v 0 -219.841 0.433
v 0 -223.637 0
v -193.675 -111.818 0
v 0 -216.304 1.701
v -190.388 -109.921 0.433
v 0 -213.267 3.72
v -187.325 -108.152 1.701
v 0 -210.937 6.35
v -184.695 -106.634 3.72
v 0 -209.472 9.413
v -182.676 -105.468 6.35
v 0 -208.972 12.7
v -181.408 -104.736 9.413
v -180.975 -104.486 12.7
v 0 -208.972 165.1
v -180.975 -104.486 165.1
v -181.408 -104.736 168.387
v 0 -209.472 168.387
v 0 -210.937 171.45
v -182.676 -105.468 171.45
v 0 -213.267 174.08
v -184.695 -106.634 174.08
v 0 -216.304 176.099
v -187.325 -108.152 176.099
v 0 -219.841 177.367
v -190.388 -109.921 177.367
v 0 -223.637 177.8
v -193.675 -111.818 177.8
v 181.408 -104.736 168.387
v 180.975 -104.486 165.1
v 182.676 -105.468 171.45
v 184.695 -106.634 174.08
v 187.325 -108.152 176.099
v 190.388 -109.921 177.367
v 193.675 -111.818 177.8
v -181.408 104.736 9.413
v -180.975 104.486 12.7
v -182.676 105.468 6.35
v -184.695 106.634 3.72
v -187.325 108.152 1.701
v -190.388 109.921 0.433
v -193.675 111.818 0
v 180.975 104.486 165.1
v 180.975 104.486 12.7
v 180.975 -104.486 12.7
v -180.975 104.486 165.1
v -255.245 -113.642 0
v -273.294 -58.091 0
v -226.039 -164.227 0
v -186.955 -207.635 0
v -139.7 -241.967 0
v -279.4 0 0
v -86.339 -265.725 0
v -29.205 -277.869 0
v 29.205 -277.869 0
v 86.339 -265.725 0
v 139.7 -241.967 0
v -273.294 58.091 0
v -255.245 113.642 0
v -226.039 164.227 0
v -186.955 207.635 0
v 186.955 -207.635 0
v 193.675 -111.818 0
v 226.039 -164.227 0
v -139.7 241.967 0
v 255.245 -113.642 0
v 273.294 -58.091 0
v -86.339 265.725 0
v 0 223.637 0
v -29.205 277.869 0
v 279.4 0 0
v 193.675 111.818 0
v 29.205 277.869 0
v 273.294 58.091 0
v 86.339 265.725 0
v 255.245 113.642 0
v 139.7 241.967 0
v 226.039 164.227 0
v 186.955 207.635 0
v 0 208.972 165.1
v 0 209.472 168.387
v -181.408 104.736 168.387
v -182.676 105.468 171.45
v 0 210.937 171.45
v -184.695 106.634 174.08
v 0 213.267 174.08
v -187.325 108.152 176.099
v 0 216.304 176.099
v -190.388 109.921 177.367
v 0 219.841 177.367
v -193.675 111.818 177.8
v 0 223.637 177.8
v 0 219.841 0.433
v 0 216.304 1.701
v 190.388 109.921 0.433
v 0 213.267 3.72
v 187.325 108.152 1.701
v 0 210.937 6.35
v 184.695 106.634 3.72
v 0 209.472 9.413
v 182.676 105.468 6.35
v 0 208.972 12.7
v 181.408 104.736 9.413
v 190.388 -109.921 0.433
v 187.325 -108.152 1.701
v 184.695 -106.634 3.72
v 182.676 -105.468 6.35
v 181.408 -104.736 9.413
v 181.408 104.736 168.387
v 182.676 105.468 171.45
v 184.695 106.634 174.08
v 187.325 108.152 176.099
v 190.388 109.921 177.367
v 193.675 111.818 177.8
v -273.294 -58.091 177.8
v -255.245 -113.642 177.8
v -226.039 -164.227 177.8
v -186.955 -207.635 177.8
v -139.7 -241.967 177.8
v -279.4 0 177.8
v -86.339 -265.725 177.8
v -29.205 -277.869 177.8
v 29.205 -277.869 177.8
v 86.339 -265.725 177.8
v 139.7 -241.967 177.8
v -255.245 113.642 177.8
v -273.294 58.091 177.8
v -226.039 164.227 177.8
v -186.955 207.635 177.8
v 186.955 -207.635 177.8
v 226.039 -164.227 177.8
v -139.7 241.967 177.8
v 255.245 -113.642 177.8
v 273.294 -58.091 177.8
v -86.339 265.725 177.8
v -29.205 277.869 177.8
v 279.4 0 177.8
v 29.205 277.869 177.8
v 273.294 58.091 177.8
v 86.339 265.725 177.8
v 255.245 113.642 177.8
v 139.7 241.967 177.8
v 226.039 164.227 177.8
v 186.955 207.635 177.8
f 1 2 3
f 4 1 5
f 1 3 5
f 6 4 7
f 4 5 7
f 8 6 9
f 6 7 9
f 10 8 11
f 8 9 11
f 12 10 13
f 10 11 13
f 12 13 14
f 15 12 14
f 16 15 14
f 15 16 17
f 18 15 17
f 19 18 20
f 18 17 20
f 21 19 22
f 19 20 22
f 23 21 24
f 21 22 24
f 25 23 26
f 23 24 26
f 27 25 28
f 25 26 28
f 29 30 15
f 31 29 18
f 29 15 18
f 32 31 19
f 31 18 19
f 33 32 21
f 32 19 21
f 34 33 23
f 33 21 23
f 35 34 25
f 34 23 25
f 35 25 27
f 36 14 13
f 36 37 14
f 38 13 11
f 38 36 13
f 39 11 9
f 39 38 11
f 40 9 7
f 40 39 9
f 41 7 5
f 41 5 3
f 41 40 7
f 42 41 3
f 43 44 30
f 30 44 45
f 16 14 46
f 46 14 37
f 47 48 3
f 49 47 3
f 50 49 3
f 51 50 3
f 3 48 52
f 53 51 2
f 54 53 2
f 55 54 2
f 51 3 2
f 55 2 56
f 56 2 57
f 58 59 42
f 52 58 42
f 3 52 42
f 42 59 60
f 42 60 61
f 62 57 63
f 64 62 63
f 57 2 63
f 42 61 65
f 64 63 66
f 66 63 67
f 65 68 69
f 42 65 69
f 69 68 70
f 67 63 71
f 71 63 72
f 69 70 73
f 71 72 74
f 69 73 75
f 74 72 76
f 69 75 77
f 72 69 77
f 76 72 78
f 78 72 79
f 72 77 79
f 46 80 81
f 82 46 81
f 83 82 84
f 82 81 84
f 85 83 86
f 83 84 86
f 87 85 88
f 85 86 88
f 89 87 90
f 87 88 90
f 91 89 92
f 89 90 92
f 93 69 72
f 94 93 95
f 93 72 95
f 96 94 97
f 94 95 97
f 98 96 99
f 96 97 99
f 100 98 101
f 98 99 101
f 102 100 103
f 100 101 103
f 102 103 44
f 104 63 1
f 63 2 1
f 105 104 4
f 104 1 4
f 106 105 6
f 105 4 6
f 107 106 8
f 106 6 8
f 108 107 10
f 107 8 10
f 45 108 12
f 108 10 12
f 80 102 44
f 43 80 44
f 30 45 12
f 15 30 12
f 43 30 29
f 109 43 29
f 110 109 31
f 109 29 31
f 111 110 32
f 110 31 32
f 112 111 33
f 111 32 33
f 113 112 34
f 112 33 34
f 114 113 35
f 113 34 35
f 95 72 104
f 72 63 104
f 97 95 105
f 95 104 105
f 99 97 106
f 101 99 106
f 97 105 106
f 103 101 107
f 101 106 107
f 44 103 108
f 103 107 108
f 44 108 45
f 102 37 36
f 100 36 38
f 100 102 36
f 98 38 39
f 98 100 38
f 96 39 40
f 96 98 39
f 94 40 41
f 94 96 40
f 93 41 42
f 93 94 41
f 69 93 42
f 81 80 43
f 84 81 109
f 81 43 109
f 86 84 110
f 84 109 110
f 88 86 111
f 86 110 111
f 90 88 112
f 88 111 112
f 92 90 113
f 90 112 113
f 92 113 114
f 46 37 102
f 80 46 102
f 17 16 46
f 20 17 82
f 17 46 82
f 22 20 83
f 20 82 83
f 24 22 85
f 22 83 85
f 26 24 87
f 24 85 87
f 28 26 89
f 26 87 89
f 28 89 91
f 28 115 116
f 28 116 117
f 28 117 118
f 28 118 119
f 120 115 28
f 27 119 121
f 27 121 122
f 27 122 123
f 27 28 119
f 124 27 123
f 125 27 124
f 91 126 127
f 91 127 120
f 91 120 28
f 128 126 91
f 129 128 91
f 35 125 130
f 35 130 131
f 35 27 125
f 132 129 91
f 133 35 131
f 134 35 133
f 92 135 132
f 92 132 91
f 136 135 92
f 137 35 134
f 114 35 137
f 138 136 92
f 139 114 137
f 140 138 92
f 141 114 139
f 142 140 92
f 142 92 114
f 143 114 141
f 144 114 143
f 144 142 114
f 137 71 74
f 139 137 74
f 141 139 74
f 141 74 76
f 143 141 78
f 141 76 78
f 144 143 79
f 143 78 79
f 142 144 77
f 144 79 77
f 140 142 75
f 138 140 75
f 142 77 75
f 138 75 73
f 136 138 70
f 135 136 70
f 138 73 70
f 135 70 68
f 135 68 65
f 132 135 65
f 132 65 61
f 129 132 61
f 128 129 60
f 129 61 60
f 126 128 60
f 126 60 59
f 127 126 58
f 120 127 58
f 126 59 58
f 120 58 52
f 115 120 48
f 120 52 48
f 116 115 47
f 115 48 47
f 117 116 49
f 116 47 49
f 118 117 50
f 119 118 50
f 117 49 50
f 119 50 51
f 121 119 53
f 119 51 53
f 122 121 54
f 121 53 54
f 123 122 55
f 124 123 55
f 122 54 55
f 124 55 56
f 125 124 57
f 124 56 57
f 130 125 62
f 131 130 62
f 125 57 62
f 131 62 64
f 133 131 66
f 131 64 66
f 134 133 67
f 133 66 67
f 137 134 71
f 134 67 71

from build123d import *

# Parameters (mm, degrees)
F0_R     = 279.4
F1_DEPTH = 177.8
F2_R     = 12.7
F3_R     = 12.7


with BuildPart() as f1:
    # F0 (on Top) → F1 (new body)
    with BuildSketch(Plane.XY):
        Circle(F0_R)
        Polygon((0, 208.97193), (180.975, 104.485965), (180.975, -104.485965), (0, -208.97193), (-180.975, -104.485965), (-180.975, 104.485965), align=None, mode=Mode.SUBTRACT)
    extrude(amount=F1_DEPTH)

    # F2
    f2_edges = [f1.edges().sort_by_distance(p)[0] for p in [
        (-90.4875, 156.728947, 177.8),
        (90.4875, 156.728947, 177.8),
        (-180.975, 0, 177.8),
        (-90.4875, -156.728947, 177.8),
        (90.4875, -156.728947, 177.8),
        (180.975, 0, 177.8),
    ]]
    fillet(f2_edges, radius=F2_R)

    # F3
    f3_edges = [f1.edges().sort_by_distance(p)[0] for p in [
        (-180.975, 0, 0),
        (-90.4875, -156.728947, 0),
        (90.4875, -156.728947, 0),
        (180.975, 0, 0),
        (90.4875, 156.728947, 0),
        (-90.4875, 156.728947, 0),
    ]]
    fillet(f3_edges, radius=F3_R)


solid = f1.part
